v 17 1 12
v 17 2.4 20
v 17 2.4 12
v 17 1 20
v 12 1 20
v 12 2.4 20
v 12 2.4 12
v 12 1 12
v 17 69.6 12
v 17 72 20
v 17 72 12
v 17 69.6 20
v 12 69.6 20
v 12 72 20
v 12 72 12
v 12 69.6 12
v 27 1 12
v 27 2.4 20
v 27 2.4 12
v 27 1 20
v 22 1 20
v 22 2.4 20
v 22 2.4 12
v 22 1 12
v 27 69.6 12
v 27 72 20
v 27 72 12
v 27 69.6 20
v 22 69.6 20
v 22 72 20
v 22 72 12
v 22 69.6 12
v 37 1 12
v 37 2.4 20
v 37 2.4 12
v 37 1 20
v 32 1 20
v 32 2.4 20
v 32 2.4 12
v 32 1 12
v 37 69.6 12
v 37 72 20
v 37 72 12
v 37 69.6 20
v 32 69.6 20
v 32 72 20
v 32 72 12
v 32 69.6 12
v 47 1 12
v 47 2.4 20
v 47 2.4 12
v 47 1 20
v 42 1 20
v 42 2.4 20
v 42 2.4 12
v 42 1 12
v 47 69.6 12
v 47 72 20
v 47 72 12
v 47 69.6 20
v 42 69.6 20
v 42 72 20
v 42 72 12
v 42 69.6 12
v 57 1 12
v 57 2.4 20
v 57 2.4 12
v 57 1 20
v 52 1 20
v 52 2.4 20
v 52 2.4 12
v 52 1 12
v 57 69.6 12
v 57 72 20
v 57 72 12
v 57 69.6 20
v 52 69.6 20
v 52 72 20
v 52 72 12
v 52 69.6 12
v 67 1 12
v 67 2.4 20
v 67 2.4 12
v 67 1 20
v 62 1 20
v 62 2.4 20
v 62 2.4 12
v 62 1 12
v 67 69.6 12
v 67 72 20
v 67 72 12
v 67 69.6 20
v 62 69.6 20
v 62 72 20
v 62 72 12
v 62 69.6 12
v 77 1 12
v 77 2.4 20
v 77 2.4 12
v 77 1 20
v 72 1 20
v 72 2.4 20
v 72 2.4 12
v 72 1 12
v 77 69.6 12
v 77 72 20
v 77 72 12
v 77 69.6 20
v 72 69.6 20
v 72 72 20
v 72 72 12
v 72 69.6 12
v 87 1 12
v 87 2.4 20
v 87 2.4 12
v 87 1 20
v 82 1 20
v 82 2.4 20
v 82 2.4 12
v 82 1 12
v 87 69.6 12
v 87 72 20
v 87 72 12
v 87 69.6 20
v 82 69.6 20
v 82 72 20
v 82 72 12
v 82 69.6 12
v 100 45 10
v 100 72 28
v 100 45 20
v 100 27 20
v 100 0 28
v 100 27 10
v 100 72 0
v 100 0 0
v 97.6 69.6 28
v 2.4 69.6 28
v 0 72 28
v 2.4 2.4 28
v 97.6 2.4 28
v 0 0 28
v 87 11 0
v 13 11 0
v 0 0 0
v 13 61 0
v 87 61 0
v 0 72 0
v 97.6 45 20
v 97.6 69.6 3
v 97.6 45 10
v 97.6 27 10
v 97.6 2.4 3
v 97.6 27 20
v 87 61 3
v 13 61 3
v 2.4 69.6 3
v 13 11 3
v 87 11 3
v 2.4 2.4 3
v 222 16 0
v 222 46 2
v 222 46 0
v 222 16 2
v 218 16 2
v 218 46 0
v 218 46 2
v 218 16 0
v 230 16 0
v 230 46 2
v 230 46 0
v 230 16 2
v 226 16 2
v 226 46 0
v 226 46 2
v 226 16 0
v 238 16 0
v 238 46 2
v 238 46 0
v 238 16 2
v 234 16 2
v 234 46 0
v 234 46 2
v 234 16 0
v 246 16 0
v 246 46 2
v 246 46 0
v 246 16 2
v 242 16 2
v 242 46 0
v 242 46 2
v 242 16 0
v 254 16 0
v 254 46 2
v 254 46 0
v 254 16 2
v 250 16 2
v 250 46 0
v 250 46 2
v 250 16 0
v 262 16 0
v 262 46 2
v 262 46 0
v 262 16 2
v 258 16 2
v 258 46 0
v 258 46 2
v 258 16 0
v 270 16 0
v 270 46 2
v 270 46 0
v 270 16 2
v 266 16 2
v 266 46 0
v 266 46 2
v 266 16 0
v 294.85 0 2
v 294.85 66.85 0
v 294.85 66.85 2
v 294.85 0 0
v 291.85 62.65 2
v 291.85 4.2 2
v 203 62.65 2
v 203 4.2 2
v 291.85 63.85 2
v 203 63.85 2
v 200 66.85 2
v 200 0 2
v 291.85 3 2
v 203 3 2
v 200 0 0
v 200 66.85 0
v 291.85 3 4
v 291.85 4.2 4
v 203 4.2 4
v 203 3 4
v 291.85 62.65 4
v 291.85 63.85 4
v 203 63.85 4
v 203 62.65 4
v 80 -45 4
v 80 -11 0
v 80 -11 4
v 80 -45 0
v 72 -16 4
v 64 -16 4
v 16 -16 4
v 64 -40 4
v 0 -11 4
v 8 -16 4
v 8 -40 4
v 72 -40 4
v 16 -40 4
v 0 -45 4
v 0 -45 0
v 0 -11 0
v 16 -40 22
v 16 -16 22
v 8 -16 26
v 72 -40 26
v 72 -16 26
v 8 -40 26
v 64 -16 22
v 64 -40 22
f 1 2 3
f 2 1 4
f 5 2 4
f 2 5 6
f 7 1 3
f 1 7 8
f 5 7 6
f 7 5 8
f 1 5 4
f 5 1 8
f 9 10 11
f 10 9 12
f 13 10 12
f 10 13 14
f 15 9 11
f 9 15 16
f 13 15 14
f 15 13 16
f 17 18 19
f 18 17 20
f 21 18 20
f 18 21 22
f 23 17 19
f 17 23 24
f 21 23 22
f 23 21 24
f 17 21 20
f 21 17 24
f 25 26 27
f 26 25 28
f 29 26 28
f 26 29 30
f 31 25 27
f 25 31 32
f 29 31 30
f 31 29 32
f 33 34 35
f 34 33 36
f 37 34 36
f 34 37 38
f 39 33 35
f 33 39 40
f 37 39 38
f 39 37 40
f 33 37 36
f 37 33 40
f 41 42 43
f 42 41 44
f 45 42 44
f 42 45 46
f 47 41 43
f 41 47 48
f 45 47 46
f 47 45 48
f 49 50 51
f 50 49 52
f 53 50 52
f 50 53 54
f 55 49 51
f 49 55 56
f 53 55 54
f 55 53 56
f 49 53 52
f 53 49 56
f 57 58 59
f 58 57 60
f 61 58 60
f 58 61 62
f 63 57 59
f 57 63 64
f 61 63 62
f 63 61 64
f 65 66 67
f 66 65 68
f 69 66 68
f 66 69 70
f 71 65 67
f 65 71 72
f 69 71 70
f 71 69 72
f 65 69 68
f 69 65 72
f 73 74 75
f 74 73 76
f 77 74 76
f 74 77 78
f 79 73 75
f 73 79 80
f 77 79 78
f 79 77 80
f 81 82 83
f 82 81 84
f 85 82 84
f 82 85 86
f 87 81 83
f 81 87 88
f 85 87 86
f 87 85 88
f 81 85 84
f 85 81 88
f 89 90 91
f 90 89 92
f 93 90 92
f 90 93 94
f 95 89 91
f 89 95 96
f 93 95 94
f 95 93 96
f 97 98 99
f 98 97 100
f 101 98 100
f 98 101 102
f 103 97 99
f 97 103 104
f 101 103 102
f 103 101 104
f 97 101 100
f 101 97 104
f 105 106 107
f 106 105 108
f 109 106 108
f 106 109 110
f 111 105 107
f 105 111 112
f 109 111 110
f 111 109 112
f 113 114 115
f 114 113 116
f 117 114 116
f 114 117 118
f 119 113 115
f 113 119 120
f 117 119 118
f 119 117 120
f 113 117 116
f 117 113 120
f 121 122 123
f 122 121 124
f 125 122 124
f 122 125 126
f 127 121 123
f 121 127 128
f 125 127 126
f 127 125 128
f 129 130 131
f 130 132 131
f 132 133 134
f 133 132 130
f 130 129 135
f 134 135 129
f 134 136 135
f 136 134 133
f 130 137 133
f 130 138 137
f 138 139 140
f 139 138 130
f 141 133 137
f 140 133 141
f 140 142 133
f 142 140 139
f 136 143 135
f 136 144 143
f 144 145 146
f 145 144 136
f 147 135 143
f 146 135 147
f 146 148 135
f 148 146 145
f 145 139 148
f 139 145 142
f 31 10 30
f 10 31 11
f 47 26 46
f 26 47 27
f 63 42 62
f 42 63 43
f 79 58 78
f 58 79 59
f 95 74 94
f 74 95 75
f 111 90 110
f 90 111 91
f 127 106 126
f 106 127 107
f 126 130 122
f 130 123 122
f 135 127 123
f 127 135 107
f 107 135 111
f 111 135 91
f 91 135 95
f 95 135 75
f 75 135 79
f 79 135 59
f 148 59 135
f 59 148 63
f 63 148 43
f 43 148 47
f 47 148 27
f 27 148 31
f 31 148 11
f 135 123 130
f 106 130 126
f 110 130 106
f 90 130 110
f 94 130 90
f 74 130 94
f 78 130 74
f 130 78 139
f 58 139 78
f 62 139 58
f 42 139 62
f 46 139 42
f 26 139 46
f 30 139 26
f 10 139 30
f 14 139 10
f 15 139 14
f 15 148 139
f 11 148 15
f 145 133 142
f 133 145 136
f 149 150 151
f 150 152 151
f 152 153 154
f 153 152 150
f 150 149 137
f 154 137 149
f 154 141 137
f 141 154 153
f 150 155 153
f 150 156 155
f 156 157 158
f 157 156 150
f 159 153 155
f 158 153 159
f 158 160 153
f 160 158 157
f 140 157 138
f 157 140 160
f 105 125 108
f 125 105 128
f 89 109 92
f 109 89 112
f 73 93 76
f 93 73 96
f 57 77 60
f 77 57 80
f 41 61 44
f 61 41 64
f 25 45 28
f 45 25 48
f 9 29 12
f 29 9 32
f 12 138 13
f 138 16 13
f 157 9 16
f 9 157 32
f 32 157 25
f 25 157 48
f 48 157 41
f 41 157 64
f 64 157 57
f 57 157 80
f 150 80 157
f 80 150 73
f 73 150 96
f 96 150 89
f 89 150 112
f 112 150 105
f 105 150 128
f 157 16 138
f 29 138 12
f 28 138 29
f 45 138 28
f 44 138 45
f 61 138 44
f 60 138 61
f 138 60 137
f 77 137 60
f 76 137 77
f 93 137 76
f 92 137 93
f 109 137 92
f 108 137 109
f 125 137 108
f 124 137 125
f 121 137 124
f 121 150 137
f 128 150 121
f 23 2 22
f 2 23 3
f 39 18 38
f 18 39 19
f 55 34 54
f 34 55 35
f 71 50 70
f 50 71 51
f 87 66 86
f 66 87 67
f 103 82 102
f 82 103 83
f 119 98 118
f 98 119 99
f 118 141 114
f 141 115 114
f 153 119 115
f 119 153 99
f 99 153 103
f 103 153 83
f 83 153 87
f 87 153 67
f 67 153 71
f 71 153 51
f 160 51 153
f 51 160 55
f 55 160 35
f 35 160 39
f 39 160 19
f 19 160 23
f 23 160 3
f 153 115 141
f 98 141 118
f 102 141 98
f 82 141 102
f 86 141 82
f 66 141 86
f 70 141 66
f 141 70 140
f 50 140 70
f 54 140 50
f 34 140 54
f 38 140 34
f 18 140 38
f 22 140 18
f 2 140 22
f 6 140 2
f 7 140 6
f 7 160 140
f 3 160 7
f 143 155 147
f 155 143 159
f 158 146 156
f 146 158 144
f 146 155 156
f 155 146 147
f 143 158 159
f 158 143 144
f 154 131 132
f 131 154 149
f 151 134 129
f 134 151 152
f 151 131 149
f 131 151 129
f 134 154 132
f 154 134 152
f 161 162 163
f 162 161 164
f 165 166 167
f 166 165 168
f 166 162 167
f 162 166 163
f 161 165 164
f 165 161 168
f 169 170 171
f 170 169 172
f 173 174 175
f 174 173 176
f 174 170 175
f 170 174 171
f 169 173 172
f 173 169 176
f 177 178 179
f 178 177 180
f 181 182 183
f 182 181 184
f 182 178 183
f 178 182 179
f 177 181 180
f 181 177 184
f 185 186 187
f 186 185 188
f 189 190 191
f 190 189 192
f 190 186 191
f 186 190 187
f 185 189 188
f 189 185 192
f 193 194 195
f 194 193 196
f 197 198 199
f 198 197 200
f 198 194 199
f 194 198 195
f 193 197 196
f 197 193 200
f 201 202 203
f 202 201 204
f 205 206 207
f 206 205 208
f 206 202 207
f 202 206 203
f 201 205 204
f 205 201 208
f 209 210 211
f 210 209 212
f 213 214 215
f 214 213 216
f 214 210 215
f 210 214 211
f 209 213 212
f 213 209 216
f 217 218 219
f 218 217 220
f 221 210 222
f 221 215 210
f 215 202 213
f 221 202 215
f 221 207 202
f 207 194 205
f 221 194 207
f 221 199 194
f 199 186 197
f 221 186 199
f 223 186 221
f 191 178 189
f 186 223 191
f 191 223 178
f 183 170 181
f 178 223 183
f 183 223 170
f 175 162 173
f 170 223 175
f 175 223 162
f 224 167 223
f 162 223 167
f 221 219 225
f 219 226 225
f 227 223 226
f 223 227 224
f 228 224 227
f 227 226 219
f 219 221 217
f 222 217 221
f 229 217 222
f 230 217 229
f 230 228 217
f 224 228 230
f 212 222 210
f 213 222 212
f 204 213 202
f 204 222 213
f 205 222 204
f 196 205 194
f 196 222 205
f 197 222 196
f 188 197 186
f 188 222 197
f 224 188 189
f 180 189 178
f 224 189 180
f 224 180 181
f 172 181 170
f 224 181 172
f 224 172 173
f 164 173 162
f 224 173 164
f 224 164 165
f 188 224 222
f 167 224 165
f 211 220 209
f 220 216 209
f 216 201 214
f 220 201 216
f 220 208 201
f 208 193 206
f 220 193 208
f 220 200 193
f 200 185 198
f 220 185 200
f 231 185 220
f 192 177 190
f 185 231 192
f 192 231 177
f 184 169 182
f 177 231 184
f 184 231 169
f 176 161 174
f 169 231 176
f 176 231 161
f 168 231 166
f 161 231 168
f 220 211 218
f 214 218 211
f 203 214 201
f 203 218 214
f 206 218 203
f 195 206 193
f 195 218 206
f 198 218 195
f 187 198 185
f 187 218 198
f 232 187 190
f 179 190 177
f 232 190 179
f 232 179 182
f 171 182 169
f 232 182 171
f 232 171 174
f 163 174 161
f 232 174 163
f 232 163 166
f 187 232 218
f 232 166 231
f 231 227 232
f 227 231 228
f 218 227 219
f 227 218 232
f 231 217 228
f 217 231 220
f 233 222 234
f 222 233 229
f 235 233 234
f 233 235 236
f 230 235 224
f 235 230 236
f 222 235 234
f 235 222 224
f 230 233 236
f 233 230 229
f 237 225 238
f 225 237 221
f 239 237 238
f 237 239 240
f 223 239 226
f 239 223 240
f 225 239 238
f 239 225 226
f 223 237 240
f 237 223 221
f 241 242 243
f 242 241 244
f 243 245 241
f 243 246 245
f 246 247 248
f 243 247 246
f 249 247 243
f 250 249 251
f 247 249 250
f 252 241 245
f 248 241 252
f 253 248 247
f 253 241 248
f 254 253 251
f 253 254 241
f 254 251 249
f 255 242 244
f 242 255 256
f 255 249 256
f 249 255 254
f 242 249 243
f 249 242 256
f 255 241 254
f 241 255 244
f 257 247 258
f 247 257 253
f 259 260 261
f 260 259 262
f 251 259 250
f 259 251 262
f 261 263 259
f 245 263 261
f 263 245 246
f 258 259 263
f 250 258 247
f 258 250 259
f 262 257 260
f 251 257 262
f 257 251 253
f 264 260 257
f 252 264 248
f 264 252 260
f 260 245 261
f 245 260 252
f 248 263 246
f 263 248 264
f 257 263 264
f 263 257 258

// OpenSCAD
// MOMO LABZ agent desk enclosure — prototype 0.2
// Units: millimetres. Measure your specific LCD before the final print.
// part = "body", "back", "stand", or "assembly".
part = "assembly";
$fn = 36;

outer_w = 100;
outer_h = 72;
outer_d = 28;
wall = 2.4;
front = 3;
screen_w = 74;
screen_h = 50;
screen_x = (outer_w - screen_w) / 2;
screen_y = (outer_h - screen_h) / 2;
fit = 0.35;

module body() {
    difference() {
        cube([outer_w, outer_h, outer_d]);
        translate([wall, wall, front])
            cube([outer_w - 2 * wall, outer_h - 2 * wall, outer_d + 1]);
        translate([screen_x, screen_y, -1])
            cube([screen_w, screen_h, front + 2]);
        // Pixel ventilation cuts at the top and bottom edges.
        for (x = [12:10:82]) {
            translate([x, 1, 12]) cube([5, wall + 1, 8]);
            translate([x, outer_h - wall - 1, 12]) cube([5, wall + 2, 8]);
        }
        // Right-side cable slot.
        translate([outer_w - wall - 1, 27, 10]) cube([wall + 2, 18, 10]);
    }
}

module back() {
    difference() {
        cube([outer_w - 2 * wall - fit, outer_h - 2 * wall - fit, 2]);
        for (x = [18:8:70])
            translate([x, 16, -1]) cube([4, 30, 4]);
    }
    // Friction ribs; lightly sand if your printer runs tight.
    translate([3, 3, 2]) cube([outer_w - 2 * wall - fit - 6, 1.2, 2]);
    translate([3, outer_h - 2 * wall - fit - 4.2, 2]) cube([outer_w - 2 * wall - fit - 6, 1.2, 2]);
}

module stand() {
    cube([80, 34, 4]);
    translate([8, 5, 4]) cube([8, 24, 22]);
    translate([64, 5, 4]) cube([8, 24, 22]);
    translate([8, 5, 22]) cube([64, 24, 4]);
}

if (part == "body") body();
if (part == "back") back();
if (part == "stand") stand();
if (part == "assembly") {
    body();
    translate([2 * outer_w, 0, 0]) back();
    translate([0, -45, 0]) stand();
}
